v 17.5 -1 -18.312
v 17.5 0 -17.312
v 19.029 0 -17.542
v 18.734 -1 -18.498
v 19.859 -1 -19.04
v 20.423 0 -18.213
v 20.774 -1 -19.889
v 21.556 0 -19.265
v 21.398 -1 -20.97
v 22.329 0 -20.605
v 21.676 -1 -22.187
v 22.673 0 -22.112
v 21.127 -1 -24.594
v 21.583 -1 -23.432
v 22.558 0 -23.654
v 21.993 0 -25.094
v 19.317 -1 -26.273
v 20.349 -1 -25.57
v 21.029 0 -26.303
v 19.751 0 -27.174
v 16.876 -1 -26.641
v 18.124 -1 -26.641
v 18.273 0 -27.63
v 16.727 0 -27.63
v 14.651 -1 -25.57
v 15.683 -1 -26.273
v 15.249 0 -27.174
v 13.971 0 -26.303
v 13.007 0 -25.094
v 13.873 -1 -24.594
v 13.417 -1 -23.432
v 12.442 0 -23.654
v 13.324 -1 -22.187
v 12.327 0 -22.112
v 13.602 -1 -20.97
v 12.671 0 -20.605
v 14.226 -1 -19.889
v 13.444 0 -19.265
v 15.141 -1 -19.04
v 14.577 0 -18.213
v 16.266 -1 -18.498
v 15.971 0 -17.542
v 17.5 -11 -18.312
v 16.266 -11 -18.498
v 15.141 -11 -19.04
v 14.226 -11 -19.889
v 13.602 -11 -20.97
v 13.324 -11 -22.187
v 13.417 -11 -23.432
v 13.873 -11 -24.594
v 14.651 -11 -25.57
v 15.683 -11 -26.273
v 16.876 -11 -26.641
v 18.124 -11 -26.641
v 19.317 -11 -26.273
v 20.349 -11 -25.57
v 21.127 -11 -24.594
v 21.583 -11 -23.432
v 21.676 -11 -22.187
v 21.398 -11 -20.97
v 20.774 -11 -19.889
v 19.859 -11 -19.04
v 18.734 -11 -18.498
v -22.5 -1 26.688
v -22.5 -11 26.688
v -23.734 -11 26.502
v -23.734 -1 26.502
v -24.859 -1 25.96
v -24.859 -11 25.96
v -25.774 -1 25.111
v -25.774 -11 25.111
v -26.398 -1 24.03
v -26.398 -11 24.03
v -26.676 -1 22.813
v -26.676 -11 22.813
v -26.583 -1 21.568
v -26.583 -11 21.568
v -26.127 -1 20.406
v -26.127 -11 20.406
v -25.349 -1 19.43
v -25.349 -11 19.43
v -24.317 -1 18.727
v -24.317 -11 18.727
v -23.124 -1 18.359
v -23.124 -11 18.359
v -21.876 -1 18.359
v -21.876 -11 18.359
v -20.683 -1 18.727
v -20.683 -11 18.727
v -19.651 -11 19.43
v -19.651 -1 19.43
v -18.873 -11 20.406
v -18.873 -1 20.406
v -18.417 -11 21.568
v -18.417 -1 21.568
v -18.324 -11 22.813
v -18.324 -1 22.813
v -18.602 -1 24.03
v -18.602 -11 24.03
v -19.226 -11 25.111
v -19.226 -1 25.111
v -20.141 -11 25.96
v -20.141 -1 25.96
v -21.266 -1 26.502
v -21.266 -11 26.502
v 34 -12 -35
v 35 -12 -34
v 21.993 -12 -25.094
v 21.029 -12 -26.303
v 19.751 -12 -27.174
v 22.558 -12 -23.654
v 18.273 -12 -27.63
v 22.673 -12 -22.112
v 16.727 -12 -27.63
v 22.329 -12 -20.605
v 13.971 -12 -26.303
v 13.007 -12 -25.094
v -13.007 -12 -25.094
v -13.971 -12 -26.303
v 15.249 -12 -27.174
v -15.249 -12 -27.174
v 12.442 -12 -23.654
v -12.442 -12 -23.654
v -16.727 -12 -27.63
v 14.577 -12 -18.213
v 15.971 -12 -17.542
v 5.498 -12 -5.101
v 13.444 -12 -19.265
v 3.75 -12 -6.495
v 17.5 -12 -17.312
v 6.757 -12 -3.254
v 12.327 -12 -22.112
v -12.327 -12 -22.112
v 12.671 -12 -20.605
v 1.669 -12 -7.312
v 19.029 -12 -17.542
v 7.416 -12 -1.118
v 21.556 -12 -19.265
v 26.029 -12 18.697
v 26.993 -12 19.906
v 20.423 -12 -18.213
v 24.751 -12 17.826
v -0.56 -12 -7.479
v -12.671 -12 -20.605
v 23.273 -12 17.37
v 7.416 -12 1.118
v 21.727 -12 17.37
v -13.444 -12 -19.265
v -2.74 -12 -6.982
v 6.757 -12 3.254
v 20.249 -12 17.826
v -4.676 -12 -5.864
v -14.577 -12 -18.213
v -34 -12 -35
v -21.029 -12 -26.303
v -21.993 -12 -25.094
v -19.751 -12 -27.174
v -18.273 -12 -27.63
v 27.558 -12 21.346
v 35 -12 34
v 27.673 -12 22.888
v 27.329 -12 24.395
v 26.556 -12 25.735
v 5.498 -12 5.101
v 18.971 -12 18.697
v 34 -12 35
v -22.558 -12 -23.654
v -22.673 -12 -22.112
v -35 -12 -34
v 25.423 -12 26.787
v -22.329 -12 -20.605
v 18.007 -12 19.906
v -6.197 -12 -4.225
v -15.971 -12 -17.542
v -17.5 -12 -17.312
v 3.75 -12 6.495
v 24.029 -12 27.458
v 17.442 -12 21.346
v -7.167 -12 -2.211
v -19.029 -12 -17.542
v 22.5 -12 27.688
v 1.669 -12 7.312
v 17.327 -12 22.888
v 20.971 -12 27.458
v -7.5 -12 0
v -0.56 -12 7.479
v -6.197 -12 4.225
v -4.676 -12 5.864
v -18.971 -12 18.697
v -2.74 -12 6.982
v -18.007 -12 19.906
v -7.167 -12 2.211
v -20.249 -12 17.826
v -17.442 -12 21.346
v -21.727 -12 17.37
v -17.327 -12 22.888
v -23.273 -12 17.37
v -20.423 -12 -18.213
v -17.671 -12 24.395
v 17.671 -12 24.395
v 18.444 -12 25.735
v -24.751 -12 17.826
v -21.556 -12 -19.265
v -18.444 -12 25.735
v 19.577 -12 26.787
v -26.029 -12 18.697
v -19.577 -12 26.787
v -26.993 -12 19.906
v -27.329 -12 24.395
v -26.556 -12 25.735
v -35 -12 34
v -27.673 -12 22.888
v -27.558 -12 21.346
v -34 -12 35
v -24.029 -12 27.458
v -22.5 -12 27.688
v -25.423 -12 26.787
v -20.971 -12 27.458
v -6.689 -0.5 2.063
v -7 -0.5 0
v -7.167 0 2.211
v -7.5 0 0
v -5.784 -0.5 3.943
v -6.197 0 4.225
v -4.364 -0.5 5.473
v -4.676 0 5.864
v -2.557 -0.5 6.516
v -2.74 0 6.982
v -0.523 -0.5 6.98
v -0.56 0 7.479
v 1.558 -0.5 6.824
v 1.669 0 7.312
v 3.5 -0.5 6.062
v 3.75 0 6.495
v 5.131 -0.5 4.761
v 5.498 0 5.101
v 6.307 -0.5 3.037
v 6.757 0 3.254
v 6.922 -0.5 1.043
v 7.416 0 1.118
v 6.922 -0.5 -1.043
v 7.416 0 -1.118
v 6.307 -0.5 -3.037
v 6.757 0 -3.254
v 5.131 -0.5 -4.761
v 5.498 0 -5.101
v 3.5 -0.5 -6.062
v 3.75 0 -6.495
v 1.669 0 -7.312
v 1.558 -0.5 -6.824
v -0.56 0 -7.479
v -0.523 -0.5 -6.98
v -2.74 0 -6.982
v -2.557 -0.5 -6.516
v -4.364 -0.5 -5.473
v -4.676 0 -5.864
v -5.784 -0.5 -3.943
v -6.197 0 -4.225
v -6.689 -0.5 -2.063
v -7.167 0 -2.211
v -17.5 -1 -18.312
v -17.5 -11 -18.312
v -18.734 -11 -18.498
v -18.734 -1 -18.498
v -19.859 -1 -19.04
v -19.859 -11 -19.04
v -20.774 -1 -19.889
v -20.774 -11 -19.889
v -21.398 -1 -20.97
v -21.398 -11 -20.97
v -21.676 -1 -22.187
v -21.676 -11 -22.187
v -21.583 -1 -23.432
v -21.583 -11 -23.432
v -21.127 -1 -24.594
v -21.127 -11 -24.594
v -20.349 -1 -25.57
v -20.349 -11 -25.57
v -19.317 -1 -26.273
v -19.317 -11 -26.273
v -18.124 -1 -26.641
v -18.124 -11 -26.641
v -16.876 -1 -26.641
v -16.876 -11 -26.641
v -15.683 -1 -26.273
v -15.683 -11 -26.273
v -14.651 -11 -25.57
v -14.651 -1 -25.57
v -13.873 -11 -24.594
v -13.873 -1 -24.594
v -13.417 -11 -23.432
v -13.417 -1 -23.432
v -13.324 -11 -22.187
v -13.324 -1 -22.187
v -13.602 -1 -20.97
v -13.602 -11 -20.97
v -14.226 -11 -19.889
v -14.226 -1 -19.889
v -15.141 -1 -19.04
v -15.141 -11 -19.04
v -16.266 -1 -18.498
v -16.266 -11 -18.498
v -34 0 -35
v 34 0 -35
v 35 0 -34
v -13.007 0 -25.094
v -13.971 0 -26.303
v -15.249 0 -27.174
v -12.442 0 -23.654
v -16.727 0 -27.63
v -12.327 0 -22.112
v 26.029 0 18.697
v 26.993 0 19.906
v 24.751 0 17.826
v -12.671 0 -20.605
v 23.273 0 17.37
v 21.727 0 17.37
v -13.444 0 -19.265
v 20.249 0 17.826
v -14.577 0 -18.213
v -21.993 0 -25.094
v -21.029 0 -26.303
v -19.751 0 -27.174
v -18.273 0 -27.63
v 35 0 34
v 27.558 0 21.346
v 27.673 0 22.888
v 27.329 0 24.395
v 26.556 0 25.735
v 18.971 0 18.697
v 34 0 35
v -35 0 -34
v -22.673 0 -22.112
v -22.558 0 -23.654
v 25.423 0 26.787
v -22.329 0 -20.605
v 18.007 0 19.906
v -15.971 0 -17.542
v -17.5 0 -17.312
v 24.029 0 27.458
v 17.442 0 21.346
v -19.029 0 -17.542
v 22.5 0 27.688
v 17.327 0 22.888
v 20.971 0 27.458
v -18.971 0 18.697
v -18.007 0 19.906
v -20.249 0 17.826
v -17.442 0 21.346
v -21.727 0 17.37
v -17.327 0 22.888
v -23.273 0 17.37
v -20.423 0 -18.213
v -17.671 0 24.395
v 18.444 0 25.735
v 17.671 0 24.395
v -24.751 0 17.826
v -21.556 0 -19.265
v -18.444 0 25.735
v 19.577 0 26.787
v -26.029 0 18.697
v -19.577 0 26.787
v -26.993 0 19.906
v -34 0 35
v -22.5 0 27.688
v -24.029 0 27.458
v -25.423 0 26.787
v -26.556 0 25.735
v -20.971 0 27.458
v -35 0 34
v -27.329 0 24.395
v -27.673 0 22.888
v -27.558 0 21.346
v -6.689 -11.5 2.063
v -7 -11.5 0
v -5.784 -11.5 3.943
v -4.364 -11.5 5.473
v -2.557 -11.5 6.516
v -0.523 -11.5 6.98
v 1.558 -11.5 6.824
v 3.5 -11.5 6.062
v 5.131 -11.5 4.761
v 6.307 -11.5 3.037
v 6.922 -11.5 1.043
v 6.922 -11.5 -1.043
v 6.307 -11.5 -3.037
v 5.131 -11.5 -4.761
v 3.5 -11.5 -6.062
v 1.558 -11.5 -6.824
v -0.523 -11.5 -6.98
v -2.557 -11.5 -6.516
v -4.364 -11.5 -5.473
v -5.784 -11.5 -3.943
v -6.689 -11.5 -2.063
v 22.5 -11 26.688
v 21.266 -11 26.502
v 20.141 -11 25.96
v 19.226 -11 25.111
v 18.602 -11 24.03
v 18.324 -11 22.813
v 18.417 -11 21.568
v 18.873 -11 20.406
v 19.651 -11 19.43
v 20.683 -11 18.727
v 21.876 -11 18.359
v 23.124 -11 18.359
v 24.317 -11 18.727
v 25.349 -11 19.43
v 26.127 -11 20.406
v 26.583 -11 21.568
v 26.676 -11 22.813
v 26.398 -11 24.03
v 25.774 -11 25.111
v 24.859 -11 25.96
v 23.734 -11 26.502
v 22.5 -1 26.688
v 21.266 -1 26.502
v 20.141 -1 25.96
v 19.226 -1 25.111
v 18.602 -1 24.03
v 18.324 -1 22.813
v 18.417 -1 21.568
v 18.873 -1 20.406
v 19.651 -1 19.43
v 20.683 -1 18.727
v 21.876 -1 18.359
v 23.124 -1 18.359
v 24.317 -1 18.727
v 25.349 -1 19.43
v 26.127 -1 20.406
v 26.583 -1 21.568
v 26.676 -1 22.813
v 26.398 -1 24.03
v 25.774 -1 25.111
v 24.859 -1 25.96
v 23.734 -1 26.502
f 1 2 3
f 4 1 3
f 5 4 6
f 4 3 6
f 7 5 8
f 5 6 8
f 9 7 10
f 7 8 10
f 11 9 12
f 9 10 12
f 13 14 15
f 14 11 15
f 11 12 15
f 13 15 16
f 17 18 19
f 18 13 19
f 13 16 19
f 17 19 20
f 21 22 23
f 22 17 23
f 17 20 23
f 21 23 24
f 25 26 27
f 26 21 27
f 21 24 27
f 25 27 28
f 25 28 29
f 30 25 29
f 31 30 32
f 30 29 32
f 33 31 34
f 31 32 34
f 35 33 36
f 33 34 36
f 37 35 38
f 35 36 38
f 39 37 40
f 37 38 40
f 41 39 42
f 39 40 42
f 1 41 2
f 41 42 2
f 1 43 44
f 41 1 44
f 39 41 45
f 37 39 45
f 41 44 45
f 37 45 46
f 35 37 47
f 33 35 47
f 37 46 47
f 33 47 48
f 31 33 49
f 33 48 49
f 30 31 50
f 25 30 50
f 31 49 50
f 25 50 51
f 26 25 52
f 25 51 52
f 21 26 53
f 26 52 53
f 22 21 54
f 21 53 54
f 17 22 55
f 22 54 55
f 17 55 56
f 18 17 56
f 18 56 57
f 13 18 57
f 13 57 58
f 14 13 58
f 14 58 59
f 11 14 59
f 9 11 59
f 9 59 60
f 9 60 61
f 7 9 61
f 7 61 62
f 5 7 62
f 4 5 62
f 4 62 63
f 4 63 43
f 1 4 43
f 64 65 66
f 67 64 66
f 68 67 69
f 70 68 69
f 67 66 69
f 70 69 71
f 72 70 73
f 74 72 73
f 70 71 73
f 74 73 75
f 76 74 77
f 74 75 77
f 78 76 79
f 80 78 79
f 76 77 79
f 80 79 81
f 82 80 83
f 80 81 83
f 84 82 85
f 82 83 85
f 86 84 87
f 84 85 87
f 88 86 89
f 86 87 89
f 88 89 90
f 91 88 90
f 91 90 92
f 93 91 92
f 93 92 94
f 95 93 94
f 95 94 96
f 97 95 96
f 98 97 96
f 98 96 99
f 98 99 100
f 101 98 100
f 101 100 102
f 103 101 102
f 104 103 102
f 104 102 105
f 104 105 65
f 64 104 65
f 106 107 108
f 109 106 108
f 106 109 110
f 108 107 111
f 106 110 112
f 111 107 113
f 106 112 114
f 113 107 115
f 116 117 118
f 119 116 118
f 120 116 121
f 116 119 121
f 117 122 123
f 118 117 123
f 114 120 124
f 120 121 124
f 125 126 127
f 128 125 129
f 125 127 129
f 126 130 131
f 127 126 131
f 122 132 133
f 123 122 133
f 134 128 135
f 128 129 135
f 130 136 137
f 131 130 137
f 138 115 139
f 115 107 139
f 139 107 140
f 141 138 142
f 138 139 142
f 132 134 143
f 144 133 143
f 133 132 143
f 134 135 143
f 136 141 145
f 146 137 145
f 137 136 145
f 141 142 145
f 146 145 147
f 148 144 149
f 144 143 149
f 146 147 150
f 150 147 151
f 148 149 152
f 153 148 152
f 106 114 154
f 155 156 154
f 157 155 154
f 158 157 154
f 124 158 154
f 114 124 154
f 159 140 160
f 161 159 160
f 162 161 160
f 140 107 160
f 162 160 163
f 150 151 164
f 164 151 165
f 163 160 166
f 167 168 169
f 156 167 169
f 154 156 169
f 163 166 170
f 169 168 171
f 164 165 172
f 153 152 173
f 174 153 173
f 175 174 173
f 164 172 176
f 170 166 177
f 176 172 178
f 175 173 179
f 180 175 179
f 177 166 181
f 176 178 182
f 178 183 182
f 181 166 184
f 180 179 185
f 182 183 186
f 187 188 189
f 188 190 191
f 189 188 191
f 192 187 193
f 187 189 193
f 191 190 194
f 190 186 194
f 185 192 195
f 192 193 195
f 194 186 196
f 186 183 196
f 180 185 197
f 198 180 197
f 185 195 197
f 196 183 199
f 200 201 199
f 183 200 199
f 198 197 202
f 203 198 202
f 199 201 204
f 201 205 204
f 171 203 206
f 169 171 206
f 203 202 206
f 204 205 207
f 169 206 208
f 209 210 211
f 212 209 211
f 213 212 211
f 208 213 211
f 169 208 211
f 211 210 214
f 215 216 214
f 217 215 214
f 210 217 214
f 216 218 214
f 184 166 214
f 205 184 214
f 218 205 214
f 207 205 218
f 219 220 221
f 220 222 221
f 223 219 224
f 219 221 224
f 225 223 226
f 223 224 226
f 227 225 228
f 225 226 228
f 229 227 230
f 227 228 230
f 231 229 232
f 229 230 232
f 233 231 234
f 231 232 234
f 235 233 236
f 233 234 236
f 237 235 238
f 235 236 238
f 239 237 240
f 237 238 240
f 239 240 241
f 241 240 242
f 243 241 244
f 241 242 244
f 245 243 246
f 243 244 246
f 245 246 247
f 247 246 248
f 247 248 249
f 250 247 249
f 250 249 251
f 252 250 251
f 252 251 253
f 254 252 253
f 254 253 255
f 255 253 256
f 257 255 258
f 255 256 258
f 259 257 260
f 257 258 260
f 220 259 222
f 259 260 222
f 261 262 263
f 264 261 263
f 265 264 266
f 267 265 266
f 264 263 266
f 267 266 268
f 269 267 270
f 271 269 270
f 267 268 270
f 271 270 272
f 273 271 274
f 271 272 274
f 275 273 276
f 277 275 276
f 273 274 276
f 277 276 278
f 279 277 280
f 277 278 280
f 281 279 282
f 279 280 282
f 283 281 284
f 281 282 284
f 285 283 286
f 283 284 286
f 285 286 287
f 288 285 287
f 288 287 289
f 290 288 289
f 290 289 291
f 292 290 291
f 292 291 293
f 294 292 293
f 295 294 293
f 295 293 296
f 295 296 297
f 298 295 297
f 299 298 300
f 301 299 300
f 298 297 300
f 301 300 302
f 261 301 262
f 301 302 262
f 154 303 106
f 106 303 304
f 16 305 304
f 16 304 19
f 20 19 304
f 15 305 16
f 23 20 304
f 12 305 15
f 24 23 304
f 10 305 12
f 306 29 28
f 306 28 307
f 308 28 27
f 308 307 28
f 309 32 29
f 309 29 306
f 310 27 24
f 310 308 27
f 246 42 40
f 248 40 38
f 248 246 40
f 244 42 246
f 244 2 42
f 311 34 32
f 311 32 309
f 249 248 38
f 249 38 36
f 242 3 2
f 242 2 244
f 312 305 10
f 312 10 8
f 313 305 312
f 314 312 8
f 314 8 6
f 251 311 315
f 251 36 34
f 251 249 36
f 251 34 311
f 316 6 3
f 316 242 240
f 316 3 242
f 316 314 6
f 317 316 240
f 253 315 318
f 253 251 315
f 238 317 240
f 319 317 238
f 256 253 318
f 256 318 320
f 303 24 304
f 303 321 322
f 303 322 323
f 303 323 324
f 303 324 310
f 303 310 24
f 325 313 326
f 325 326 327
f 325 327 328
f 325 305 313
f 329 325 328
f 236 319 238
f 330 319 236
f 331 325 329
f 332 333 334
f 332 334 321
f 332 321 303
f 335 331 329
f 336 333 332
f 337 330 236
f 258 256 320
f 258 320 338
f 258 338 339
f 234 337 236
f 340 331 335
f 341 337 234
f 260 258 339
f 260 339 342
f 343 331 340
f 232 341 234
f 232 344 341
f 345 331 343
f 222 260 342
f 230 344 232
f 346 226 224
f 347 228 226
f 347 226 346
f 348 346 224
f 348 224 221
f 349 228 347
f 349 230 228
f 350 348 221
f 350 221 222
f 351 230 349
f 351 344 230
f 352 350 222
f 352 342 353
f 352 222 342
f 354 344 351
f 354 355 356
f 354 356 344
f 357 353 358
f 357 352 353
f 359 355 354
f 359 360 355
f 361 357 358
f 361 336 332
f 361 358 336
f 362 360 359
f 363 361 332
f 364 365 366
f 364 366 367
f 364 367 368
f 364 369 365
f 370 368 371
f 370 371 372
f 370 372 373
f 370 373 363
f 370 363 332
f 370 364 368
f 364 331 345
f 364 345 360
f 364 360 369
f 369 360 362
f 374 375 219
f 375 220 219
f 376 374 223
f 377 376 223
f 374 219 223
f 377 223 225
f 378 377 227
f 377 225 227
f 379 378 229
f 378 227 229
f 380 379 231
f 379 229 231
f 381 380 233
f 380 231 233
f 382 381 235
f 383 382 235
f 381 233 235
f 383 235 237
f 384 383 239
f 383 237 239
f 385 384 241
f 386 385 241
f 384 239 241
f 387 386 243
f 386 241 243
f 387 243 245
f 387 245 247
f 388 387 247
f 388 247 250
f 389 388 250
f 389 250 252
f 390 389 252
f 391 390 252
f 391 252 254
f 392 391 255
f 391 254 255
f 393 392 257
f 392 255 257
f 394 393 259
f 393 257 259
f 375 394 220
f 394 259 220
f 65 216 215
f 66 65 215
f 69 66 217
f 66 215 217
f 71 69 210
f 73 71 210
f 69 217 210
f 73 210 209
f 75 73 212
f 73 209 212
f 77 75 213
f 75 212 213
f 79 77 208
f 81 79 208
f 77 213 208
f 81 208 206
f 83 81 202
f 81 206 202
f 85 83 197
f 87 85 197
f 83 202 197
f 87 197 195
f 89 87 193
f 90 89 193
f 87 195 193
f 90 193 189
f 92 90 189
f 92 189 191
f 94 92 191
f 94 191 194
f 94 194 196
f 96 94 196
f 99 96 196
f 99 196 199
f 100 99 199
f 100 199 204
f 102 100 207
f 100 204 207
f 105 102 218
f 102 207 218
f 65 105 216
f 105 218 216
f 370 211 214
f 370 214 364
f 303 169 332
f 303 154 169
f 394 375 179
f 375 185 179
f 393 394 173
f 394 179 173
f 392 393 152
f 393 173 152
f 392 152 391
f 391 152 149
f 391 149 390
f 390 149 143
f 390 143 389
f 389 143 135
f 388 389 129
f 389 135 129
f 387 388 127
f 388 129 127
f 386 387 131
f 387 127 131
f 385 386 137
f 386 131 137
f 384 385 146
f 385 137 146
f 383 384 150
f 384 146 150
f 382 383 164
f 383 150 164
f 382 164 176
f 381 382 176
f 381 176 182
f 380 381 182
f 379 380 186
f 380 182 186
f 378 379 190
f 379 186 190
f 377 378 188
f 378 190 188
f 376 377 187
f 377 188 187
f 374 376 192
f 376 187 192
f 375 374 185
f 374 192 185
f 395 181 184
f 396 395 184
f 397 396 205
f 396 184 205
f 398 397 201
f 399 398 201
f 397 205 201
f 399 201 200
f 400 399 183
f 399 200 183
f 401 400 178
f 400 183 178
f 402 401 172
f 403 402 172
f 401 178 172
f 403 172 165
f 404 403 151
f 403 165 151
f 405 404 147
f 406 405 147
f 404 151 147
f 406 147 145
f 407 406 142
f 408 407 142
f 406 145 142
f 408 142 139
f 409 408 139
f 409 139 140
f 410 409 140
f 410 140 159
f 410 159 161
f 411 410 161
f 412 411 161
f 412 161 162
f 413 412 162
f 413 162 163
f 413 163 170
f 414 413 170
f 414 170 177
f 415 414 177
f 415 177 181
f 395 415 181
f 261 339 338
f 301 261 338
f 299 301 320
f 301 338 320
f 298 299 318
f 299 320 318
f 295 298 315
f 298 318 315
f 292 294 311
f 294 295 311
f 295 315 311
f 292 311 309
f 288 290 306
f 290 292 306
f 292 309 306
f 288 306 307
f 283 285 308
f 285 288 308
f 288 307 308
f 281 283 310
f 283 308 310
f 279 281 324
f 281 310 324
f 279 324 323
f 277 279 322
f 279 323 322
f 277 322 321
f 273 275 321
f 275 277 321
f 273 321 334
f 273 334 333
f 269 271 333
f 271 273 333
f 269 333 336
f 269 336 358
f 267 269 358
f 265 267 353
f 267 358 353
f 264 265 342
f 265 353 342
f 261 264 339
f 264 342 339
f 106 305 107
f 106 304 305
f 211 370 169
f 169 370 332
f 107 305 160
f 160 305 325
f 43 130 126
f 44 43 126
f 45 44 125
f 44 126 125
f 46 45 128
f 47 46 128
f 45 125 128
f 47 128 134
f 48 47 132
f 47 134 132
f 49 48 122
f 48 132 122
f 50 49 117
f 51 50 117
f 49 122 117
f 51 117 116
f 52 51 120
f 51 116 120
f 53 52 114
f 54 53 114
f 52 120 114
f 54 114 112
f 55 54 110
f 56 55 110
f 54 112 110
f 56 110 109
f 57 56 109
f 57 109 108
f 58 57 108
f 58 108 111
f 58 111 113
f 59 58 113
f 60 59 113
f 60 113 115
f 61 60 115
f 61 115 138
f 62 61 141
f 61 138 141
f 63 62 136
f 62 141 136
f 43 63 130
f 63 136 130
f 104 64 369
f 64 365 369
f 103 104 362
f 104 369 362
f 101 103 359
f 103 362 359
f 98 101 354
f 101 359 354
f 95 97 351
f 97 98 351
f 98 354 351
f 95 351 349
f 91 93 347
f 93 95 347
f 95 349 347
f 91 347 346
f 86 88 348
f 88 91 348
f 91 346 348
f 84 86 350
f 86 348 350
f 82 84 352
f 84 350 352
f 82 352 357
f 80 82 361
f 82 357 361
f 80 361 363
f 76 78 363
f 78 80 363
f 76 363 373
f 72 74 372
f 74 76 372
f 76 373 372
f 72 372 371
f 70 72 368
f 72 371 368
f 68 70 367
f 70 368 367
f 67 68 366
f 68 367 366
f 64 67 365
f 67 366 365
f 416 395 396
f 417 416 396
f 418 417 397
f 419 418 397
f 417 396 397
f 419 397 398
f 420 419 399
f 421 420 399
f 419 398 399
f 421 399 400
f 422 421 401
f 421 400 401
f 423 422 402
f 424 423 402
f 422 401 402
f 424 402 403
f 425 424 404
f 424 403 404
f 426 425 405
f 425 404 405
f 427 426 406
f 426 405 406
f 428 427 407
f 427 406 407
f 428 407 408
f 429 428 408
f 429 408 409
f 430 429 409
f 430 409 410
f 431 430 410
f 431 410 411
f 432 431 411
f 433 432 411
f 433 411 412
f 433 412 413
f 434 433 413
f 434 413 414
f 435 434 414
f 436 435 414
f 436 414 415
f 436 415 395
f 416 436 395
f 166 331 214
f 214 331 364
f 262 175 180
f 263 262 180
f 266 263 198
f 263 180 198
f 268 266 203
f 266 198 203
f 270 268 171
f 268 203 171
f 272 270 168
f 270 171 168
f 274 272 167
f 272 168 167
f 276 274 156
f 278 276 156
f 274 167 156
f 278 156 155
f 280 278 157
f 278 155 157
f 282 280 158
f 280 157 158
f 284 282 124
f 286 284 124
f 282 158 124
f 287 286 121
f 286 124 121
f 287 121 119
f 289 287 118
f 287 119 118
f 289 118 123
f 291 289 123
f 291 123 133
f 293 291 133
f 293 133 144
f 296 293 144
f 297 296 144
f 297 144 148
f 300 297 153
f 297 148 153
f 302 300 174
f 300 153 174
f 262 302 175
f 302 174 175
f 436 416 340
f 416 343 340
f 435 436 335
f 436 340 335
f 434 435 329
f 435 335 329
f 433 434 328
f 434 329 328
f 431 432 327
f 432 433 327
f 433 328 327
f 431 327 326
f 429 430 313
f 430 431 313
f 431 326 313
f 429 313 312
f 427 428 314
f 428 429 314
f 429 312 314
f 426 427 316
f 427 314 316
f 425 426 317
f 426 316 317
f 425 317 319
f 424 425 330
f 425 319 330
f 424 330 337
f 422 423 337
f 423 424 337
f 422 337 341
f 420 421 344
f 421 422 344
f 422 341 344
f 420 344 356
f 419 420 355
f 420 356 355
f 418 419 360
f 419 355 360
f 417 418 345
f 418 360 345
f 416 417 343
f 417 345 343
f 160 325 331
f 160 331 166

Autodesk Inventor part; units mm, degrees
ref_plane "YZ Plane" through (0, 0, 0) normal (1, 0, 0) x (0, 1, 0)
ref_plane "XZ Plane" through (0, 0, 0) normal (0, 1, 0) x (-1, 0, 0)
ref_plane "XY Plane" through (0, 0, 0) normal (0, 0, 1) x (1, 0, 0)
sketch "Sketch1" plane through (0, 0, 0) normal (0, 1, 0) x (-1, 0, 0)
  line L0 (-35, 35) -> (35, 35)
  line L1 (35, 35) -> (35, -35)
  line L2 (35, -35) -> (-35, -35)
  line L3 (-35, -35) -> (-35, 35)
  line L4 (-35, 35) -> (35, -35) construction
  line L5 (35, 35) -> (-35, -35) construction
  line L6 (-22.5, 22.5) -> (22.5, 22.5) construction
  line L7 (22.5, 22.5) -> (22.5, -22.5) construction
  line L8 (22.5, -22.5) -> (-22.5, -22.5) construction
  line L9 (-22.5, -22.5) -> (-22.5, 22.5) construction
  line L10 (-22.5, 22.5) -> (22.5, -22.5) construction
  line L11 (22.5, 22.5) -> (-22.5, -22.5) construction
  circle A0 centre (0, 0) radius 7
  line L12 (17.5, 22.5) -> (-17.5, 22.5) construction
  line L13 (-17.5, 22.5) -> (-17.5, -22.5) construction
  line L14 (-17.5, -22.5) -> (17.5, -22.5) construction
  line L15 (17.5, -22.5) -> (17.5, 22.5) construction
  line L16 (49, 0) -> (-49, 0) construction
  line L17 (0, -49) -> (0, 49) construction
  dimension "d0" = 70
  dimension "d1" = 45
  dimension "d2" = 14
  dimension "d19" = 70
  dimension "d20" = 35
  dimension "d21" = 45
  dimension "d25" = 12.5
  dimension "d26" = 17.5
extrude "Extrusion1" add sketch "Sketch1" against normal blind 12
hole "Hole1" at (-22.5, 0, 22.5) at (22.5, 0, 22.5) at (-17.5, 0, -22.5) at (17.5, 0, -22.5) direction (0, -1, 0) diameter 8.376 end through all thread size "M10x1.5" class "6H" standard "ISO Metric profile"
chamfer "Chamfer1" distance 1 angle 45 8 edges at (17.5, 0, -26.688) (-17.5, 0, -26.688) (22.5, 0, 18.312) (-22.5, 0, 18.312) (17.5, -12, -26.688) (-17.5, -12, -26.688) (22.5, -12, 18.312) (-22.5, -12, 18.312)
chamfer "Chamfer2" distance 0.5 angle 45 2 edges at (7, 0, 0) (7, -12, 0)
chamfer "Chamfer3" distance 1 angle 45 4 edges at (-35, -6, 35) (-35, -6, -35) (35, -6, -35) (35, -6, 35)
properties part number "AP1-001"
